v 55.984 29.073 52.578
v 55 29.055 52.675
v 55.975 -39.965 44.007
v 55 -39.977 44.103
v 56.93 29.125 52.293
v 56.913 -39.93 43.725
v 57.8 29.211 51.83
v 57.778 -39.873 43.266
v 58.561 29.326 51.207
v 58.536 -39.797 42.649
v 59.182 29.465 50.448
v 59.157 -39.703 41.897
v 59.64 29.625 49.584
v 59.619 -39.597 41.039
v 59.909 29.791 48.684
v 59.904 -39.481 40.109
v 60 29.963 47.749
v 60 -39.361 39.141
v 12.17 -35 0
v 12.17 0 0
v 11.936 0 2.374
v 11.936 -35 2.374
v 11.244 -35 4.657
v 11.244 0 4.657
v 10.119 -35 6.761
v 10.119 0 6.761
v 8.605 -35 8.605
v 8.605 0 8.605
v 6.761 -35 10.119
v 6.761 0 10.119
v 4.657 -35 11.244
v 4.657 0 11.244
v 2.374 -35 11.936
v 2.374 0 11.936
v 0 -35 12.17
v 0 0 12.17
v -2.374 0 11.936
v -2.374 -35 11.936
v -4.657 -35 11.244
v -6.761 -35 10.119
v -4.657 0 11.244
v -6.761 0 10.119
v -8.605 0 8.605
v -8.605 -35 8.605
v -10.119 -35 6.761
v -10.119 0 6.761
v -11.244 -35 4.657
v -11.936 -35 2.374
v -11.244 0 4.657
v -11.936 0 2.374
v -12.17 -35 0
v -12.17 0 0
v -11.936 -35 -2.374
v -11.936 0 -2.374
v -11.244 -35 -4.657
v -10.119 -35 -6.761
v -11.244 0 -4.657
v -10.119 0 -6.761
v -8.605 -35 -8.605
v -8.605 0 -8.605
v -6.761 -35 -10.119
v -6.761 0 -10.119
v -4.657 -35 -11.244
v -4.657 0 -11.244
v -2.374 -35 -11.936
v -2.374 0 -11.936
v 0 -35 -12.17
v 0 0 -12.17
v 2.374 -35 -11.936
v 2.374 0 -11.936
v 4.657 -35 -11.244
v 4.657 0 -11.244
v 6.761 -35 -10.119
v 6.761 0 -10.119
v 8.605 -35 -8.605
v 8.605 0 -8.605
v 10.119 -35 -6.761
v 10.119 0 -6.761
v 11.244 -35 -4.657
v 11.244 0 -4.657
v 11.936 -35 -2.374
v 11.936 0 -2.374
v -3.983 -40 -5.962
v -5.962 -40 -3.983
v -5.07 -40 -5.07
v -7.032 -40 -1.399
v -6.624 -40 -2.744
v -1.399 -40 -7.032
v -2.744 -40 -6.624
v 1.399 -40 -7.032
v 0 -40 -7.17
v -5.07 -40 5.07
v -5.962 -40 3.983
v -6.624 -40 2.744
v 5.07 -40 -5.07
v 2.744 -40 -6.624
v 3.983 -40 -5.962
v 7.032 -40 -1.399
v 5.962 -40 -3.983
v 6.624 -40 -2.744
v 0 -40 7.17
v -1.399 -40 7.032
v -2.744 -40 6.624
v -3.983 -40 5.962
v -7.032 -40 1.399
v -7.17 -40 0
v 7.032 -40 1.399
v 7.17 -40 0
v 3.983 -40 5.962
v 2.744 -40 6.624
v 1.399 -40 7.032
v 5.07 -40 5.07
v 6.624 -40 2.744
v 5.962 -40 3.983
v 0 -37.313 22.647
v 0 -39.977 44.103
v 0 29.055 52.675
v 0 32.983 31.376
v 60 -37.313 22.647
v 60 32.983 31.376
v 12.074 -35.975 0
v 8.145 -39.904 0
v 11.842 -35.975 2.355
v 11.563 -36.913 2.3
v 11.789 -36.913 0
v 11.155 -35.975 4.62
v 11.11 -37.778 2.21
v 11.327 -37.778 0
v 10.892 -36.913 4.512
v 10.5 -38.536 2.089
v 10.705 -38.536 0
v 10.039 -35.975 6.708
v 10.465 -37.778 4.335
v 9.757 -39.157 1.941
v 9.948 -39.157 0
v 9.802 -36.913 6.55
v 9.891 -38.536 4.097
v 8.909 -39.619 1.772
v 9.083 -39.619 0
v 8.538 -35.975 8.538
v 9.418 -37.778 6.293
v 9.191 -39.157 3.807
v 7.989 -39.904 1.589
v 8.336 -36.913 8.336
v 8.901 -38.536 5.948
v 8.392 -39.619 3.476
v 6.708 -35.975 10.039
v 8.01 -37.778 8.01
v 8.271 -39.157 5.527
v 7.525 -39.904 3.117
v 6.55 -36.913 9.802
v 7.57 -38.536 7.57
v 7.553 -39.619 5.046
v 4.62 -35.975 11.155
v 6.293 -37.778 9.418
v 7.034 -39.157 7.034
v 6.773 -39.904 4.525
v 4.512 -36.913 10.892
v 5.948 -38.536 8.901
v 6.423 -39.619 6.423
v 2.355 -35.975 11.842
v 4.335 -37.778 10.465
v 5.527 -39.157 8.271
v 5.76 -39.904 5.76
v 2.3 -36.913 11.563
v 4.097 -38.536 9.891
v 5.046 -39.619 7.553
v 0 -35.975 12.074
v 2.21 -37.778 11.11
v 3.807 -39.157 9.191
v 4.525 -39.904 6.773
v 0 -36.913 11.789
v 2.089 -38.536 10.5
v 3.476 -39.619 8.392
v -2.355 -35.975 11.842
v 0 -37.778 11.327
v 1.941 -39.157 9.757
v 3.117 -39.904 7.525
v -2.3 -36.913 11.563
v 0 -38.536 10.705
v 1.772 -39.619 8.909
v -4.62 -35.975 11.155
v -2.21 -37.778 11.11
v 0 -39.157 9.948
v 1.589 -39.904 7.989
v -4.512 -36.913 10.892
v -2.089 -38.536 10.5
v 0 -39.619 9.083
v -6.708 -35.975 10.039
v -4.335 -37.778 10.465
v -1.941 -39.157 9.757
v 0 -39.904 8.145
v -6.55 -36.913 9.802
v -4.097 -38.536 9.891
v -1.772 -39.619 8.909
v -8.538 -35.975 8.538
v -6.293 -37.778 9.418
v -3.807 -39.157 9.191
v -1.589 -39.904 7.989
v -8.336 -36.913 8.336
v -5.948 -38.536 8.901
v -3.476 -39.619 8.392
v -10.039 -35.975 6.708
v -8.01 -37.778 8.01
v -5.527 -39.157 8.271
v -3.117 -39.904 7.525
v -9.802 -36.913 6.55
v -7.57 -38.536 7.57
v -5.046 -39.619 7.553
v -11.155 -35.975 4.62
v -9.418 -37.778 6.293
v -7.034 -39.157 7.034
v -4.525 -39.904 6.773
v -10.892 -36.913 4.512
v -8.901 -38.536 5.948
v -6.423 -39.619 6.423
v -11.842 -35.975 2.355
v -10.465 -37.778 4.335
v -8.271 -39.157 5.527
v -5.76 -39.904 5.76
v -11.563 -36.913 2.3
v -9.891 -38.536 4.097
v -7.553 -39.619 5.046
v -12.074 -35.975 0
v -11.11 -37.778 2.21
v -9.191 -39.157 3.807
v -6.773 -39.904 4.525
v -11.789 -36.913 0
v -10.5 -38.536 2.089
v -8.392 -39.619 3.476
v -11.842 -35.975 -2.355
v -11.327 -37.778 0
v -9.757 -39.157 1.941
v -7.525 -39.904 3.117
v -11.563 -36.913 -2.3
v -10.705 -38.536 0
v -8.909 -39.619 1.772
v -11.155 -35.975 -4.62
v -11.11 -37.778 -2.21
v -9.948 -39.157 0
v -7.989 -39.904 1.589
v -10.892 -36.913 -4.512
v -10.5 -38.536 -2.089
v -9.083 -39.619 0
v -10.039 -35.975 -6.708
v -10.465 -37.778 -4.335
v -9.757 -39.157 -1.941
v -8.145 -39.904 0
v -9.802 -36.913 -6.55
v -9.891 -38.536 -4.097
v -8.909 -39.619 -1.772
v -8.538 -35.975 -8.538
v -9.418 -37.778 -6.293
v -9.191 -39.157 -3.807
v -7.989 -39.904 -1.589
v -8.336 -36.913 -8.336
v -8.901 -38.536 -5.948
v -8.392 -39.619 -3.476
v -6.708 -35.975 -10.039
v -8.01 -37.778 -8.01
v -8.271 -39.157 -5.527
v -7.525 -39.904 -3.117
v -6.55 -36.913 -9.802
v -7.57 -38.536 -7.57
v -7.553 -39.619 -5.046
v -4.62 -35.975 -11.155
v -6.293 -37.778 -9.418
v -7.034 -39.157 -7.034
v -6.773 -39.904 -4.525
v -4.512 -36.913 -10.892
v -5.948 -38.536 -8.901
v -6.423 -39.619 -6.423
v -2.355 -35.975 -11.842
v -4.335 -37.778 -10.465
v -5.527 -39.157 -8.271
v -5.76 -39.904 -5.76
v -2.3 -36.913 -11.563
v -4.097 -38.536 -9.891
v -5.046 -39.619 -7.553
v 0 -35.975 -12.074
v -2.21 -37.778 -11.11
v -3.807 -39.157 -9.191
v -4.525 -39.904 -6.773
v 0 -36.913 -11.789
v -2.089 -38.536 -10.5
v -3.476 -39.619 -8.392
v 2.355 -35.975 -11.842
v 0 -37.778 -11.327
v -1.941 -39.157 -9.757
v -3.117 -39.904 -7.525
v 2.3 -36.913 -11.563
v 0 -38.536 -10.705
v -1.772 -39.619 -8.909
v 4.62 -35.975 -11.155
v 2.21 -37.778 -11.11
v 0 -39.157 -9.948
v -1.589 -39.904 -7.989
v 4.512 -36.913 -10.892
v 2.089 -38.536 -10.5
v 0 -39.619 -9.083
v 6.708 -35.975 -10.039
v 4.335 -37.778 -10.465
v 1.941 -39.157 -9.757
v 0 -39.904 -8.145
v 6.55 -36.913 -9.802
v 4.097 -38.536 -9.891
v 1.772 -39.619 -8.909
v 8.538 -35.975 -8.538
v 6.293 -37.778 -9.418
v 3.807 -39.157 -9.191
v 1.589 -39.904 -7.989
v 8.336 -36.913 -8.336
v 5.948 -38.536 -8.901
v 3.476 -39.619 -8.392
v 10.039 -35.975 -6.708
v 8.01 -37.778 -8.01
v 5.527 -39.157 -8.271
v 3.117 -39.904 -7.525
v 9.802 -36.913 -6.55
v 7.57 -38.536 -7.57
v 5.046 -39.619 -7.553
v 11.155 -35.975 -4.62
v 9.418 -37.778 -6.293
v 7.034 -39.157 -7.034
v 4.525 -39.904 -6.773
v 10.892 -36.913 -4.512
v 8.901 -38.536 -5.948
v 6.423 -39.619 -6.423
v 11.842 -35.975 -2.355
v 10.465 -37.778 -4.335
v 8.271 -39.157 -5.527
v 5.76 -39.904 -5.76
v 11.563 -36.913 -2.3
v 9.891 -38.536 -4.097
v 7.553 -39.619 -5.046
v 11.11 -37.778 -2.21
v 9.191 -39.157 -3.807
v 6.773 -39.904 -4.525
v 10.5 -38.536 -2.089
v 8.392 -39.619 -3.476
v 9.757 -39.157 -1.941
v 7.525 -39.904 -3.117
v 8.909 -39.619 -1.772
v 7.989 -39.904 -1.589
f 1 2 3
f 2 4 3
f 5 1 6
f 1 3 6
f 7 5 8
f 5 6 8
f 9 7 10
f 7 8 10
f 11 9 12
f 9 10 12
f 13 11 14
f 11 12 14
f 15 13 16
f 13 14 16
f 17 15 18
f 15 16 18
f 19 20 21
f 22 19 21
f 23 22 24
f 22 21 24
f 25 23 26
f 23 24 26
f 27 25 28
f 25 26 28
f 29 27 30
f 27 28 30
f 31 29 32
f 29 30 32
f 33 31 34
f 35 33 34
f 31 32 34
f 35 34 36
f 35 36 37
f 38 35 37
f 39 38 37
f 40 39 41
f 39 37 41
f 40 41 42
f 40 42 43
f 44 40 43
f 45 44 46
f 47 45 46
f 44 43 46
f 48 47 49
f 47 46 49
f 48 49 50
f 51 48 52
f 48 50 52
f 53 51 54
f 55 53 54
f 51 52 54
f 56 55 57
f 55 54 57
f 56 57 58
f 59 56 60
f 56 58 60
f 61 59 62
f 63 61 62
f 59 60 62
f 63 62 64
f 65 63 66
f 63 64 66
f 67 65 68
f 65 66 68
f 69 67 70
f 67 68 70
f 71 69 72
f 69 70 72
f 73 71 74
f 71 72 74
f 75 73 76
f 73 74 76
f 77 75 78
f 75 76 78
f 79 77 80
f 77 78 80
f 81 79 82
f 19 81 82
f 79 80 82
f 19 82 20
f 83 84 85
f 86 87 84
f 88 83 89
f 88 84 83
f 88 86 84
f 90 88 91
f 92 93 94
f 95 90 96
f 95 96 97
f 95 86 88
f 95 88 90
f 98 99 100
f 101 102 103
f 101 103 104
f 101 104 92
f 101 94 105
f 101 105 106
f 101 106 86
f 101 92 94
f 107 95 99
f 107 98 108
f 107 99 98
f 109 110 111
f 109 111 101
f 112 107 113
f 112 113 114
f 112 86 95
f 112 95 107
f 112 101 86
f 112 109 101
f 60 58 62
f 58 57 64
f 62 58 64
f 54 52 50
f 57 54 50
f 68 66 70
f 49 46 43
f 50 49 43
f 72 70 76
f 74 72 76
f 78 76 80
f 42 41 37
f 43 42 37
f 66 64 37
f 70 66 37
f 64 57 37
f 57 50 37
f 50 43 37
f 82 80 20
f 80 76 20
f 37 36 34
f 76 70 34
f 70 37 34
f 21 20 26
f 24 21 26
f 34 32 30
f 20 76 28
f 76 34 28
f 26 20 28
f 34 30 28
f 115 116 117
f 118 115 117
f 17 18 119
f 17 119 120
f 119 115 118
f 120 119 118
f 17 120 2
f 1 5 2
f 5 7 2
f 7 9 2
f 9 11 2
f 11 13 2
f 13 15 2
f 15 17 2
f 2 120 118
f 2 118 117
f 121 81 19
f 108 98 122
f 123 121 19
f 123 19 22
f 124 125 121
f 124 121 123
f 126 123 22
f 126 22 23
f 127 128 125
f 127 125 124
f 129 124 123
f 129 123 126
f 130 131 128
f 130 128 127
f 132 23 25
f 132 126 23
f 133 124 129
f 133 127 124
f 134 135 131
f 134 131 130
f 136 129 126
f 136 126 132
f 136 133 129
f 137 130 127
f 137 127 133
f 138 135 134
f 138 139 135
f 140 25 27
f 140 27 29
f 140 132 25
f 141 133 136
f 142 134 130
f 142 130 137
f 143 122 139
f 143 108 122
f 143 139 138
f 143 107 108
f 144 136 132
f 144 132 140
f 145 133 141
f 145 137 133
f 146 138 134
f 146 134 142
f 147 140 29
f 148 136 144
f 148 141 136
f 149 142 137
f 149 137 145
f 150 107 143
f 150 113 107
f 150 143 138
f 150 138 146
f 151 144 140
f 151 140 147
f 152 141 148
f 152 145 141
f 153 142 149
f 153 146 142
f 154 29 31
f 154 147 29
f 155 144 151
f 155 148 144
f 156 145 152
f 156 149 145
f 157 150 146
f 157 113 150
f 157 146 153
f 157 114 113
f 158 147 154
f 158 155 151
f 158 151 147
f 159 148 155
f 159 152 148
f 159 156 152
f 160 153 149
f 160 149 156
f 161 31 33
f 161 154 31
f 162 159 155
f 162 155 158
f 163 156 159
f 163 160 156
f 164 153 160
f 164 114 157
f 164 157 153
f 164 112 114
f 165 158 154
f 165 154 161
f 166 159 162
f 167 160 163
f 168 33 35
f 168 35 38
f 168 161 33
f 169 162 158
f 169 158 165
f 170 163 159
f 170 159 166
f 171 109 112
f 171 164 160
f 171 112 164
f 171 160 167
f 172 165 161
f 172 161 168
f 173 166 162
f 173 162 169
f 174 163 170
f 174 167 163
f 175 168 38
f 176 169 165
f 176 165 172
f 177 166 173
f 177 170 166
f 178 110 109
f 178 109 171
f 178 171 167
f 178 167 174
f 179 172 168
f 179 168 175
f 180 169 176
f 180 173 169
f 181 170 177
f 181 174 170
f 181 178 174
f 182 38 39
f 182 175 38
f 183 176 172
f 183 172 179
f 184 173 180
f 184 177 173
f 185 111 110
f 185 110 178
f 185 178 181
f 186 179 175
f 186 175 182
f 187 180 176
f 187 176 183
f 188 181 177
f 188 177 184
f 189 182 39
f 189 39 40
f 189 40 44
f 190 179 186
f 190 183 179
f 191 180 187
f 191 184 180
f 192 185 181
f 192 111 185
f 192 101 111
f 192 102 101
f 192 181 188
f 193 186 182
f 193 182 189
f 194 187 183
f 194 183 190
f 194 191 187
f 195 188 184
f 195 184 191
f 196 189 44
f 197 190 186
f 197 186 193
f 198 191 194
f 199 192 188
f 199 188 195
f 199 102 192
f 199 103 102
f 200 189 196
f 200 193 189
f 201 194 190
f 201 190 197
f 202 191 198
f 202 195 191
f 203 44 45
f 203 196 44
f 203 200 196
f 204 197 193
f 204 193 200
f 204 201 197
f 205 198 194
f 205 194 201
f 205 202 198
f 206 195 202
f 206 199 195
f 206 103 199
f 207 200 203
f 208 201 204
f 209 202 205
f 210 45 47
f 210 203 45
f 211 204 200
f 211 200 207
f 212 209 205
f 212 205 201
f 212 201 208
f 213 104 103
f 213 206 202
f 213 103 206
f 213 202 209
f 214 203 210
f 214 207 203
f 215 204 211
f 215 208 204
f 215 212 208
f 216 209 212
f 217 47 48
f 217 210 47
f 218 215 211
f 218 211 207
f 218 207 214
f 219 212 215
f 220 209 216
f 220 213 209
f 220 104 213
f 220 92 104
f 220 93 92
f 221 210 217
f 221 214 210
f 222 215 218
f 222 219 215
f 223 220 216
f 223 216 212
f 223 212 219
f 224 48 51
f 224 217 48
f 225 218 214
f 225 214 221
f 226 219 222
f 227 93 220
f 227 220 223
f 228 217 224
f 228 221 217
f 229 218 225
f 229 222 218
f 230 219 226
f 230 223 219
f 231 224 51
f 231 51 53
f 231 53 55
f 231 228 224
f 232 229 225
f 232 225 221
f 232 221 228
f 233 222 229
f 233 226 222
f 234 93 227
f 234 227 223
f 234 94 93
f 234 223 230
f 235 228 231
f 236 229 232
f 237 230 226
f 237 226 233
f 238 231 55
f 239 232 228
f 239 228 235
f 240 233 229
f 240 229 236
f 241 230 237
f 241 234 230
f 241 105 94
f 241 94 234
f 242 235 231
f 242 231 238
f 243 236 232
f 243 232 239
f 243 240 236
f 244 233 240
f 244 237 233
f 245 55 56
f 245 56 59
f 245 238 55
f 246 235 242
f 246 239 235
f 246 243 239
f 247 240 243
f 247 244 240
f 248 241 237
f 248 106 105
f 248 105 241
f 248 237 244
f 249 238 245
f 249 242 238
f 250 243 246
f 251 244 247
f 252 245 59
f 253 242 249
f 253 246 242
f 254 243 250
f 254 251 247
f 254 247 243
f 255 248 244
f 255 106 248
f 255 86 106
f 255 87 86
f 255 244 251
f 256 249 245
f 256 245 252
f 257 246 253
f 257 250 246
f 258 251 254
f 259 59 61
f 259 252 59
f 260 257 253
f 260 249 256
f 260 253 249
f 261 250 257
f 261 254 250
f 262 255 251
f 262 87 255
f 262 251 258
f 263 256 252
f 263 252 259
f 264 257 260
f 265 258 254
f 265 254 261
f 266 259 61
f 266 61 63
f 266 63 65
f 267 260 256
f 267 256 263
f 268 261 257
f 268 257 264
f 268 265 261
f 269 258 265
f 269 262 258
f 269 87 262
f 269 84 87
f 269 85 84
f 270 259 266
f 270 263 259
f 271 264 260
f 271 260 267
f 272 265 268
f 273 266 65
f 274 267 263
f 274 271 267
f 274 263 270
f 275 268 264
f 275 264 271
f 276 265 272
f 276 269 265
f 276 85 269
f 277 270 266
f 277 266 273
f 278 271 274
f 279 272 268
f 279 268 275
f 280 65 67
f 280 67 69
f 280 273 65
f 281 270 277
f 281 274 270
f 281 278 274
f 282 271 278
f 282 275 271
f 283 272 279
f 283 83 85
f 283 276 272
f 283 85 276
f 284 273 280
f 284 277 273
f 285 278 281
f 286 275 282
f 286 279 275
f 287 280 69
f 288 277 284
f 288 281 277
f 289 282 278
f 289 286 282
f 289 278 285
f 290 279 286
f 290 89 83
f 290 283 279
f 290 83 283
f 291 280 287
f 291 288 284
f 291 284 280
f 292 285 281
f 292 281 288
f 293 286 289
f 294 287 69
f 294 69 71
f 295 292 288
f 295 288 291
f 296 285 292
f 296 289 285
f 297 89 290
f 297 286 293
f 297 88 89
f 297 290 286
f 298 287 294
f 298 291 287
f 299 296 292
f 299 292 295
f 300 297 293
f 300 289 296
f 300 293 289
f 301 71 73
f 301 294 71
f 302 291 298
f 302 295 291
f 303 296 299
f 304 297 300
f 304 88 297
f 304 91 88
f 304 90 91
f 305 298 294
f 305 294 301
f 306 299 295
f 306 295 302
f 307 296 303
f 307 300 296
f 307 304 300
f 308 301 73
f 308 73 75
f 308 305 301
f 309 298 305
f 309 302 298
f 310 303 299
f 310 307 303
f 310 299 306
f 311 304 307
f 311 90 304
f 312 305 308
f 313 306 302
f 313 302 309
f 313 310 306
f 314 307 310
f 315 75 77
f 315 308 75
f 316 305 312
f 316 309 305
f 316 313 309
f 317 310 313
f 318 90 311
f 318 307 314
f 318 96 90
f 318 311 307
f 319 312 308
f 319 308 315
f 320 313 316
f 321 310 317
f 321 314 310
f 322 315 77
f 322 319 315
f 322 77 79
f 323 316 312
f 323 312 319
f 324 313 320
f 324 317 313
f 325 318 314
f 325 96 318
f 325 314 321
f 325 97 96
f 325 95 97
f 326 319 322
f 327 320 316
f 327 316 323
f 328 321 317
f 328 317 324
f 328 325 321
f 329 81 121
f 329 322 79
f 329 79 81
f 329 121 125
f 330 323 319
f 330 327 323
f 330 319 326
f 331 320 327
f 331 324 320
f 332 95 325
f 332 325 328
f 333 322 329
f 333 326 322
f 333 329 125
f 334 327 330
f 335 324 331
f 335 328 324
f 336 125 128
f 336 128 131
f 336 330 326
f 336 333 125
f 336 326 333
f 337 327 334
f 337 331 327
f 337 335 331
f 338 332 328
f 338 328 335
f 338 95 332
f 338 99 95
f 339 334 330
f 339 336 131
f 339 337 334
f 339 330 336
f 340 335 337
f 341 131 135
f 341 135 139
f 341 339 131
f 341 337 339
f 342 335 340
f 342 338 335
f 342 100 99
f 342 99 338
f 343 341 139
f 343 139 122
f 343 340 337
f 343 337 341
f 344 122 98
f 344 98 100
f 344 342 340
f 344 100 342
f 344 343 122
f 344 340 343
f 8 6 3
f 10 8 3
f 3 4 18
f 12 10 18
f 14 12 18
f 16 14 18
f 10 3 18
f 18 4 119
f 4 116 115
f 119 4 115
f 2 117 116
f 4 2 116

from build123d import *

# Parameters (mm, degrees)
F0_R     = 12.169944
F1_DEPTH = 40
F2_R     = 5
F4_DEPTH = 60
F5_R     = 5


with BuildPart() as f1:
    # F0 (on Front) → F1 (new body)
    with BuildSketch(Plane.XZ):
        Circle(F0_R)
    extrude(amount=F1_DEPTH)

    # F2
    f2_edges = [f1.edges().sort_by_distance(p)[0] for p in [
        (-12.169944, -40, 0),
    ]]
    fillet(f2_edges, radius=F2_R)


with BuildPart() as f4:
    # F3 (on Right) → F4 (new body)
    with BuildSketch(Plane.YZ):
        Polygon((29.054806, 52.674659), (-39.976977, 44.102501), (-37.312651, 22.646621), (32.983382, 31.375769), align=None)
    extrude(amount=F4_DEPTH)

    # F5
    f5_edges = [f4.edges().sort_by_distance(p)[0] for p in [
        (60, -5.461086, 48.38858),
    ]]
    fillet(f5_edges, radius=F5_R)


solid = Compound([f1.part, f4.part])
